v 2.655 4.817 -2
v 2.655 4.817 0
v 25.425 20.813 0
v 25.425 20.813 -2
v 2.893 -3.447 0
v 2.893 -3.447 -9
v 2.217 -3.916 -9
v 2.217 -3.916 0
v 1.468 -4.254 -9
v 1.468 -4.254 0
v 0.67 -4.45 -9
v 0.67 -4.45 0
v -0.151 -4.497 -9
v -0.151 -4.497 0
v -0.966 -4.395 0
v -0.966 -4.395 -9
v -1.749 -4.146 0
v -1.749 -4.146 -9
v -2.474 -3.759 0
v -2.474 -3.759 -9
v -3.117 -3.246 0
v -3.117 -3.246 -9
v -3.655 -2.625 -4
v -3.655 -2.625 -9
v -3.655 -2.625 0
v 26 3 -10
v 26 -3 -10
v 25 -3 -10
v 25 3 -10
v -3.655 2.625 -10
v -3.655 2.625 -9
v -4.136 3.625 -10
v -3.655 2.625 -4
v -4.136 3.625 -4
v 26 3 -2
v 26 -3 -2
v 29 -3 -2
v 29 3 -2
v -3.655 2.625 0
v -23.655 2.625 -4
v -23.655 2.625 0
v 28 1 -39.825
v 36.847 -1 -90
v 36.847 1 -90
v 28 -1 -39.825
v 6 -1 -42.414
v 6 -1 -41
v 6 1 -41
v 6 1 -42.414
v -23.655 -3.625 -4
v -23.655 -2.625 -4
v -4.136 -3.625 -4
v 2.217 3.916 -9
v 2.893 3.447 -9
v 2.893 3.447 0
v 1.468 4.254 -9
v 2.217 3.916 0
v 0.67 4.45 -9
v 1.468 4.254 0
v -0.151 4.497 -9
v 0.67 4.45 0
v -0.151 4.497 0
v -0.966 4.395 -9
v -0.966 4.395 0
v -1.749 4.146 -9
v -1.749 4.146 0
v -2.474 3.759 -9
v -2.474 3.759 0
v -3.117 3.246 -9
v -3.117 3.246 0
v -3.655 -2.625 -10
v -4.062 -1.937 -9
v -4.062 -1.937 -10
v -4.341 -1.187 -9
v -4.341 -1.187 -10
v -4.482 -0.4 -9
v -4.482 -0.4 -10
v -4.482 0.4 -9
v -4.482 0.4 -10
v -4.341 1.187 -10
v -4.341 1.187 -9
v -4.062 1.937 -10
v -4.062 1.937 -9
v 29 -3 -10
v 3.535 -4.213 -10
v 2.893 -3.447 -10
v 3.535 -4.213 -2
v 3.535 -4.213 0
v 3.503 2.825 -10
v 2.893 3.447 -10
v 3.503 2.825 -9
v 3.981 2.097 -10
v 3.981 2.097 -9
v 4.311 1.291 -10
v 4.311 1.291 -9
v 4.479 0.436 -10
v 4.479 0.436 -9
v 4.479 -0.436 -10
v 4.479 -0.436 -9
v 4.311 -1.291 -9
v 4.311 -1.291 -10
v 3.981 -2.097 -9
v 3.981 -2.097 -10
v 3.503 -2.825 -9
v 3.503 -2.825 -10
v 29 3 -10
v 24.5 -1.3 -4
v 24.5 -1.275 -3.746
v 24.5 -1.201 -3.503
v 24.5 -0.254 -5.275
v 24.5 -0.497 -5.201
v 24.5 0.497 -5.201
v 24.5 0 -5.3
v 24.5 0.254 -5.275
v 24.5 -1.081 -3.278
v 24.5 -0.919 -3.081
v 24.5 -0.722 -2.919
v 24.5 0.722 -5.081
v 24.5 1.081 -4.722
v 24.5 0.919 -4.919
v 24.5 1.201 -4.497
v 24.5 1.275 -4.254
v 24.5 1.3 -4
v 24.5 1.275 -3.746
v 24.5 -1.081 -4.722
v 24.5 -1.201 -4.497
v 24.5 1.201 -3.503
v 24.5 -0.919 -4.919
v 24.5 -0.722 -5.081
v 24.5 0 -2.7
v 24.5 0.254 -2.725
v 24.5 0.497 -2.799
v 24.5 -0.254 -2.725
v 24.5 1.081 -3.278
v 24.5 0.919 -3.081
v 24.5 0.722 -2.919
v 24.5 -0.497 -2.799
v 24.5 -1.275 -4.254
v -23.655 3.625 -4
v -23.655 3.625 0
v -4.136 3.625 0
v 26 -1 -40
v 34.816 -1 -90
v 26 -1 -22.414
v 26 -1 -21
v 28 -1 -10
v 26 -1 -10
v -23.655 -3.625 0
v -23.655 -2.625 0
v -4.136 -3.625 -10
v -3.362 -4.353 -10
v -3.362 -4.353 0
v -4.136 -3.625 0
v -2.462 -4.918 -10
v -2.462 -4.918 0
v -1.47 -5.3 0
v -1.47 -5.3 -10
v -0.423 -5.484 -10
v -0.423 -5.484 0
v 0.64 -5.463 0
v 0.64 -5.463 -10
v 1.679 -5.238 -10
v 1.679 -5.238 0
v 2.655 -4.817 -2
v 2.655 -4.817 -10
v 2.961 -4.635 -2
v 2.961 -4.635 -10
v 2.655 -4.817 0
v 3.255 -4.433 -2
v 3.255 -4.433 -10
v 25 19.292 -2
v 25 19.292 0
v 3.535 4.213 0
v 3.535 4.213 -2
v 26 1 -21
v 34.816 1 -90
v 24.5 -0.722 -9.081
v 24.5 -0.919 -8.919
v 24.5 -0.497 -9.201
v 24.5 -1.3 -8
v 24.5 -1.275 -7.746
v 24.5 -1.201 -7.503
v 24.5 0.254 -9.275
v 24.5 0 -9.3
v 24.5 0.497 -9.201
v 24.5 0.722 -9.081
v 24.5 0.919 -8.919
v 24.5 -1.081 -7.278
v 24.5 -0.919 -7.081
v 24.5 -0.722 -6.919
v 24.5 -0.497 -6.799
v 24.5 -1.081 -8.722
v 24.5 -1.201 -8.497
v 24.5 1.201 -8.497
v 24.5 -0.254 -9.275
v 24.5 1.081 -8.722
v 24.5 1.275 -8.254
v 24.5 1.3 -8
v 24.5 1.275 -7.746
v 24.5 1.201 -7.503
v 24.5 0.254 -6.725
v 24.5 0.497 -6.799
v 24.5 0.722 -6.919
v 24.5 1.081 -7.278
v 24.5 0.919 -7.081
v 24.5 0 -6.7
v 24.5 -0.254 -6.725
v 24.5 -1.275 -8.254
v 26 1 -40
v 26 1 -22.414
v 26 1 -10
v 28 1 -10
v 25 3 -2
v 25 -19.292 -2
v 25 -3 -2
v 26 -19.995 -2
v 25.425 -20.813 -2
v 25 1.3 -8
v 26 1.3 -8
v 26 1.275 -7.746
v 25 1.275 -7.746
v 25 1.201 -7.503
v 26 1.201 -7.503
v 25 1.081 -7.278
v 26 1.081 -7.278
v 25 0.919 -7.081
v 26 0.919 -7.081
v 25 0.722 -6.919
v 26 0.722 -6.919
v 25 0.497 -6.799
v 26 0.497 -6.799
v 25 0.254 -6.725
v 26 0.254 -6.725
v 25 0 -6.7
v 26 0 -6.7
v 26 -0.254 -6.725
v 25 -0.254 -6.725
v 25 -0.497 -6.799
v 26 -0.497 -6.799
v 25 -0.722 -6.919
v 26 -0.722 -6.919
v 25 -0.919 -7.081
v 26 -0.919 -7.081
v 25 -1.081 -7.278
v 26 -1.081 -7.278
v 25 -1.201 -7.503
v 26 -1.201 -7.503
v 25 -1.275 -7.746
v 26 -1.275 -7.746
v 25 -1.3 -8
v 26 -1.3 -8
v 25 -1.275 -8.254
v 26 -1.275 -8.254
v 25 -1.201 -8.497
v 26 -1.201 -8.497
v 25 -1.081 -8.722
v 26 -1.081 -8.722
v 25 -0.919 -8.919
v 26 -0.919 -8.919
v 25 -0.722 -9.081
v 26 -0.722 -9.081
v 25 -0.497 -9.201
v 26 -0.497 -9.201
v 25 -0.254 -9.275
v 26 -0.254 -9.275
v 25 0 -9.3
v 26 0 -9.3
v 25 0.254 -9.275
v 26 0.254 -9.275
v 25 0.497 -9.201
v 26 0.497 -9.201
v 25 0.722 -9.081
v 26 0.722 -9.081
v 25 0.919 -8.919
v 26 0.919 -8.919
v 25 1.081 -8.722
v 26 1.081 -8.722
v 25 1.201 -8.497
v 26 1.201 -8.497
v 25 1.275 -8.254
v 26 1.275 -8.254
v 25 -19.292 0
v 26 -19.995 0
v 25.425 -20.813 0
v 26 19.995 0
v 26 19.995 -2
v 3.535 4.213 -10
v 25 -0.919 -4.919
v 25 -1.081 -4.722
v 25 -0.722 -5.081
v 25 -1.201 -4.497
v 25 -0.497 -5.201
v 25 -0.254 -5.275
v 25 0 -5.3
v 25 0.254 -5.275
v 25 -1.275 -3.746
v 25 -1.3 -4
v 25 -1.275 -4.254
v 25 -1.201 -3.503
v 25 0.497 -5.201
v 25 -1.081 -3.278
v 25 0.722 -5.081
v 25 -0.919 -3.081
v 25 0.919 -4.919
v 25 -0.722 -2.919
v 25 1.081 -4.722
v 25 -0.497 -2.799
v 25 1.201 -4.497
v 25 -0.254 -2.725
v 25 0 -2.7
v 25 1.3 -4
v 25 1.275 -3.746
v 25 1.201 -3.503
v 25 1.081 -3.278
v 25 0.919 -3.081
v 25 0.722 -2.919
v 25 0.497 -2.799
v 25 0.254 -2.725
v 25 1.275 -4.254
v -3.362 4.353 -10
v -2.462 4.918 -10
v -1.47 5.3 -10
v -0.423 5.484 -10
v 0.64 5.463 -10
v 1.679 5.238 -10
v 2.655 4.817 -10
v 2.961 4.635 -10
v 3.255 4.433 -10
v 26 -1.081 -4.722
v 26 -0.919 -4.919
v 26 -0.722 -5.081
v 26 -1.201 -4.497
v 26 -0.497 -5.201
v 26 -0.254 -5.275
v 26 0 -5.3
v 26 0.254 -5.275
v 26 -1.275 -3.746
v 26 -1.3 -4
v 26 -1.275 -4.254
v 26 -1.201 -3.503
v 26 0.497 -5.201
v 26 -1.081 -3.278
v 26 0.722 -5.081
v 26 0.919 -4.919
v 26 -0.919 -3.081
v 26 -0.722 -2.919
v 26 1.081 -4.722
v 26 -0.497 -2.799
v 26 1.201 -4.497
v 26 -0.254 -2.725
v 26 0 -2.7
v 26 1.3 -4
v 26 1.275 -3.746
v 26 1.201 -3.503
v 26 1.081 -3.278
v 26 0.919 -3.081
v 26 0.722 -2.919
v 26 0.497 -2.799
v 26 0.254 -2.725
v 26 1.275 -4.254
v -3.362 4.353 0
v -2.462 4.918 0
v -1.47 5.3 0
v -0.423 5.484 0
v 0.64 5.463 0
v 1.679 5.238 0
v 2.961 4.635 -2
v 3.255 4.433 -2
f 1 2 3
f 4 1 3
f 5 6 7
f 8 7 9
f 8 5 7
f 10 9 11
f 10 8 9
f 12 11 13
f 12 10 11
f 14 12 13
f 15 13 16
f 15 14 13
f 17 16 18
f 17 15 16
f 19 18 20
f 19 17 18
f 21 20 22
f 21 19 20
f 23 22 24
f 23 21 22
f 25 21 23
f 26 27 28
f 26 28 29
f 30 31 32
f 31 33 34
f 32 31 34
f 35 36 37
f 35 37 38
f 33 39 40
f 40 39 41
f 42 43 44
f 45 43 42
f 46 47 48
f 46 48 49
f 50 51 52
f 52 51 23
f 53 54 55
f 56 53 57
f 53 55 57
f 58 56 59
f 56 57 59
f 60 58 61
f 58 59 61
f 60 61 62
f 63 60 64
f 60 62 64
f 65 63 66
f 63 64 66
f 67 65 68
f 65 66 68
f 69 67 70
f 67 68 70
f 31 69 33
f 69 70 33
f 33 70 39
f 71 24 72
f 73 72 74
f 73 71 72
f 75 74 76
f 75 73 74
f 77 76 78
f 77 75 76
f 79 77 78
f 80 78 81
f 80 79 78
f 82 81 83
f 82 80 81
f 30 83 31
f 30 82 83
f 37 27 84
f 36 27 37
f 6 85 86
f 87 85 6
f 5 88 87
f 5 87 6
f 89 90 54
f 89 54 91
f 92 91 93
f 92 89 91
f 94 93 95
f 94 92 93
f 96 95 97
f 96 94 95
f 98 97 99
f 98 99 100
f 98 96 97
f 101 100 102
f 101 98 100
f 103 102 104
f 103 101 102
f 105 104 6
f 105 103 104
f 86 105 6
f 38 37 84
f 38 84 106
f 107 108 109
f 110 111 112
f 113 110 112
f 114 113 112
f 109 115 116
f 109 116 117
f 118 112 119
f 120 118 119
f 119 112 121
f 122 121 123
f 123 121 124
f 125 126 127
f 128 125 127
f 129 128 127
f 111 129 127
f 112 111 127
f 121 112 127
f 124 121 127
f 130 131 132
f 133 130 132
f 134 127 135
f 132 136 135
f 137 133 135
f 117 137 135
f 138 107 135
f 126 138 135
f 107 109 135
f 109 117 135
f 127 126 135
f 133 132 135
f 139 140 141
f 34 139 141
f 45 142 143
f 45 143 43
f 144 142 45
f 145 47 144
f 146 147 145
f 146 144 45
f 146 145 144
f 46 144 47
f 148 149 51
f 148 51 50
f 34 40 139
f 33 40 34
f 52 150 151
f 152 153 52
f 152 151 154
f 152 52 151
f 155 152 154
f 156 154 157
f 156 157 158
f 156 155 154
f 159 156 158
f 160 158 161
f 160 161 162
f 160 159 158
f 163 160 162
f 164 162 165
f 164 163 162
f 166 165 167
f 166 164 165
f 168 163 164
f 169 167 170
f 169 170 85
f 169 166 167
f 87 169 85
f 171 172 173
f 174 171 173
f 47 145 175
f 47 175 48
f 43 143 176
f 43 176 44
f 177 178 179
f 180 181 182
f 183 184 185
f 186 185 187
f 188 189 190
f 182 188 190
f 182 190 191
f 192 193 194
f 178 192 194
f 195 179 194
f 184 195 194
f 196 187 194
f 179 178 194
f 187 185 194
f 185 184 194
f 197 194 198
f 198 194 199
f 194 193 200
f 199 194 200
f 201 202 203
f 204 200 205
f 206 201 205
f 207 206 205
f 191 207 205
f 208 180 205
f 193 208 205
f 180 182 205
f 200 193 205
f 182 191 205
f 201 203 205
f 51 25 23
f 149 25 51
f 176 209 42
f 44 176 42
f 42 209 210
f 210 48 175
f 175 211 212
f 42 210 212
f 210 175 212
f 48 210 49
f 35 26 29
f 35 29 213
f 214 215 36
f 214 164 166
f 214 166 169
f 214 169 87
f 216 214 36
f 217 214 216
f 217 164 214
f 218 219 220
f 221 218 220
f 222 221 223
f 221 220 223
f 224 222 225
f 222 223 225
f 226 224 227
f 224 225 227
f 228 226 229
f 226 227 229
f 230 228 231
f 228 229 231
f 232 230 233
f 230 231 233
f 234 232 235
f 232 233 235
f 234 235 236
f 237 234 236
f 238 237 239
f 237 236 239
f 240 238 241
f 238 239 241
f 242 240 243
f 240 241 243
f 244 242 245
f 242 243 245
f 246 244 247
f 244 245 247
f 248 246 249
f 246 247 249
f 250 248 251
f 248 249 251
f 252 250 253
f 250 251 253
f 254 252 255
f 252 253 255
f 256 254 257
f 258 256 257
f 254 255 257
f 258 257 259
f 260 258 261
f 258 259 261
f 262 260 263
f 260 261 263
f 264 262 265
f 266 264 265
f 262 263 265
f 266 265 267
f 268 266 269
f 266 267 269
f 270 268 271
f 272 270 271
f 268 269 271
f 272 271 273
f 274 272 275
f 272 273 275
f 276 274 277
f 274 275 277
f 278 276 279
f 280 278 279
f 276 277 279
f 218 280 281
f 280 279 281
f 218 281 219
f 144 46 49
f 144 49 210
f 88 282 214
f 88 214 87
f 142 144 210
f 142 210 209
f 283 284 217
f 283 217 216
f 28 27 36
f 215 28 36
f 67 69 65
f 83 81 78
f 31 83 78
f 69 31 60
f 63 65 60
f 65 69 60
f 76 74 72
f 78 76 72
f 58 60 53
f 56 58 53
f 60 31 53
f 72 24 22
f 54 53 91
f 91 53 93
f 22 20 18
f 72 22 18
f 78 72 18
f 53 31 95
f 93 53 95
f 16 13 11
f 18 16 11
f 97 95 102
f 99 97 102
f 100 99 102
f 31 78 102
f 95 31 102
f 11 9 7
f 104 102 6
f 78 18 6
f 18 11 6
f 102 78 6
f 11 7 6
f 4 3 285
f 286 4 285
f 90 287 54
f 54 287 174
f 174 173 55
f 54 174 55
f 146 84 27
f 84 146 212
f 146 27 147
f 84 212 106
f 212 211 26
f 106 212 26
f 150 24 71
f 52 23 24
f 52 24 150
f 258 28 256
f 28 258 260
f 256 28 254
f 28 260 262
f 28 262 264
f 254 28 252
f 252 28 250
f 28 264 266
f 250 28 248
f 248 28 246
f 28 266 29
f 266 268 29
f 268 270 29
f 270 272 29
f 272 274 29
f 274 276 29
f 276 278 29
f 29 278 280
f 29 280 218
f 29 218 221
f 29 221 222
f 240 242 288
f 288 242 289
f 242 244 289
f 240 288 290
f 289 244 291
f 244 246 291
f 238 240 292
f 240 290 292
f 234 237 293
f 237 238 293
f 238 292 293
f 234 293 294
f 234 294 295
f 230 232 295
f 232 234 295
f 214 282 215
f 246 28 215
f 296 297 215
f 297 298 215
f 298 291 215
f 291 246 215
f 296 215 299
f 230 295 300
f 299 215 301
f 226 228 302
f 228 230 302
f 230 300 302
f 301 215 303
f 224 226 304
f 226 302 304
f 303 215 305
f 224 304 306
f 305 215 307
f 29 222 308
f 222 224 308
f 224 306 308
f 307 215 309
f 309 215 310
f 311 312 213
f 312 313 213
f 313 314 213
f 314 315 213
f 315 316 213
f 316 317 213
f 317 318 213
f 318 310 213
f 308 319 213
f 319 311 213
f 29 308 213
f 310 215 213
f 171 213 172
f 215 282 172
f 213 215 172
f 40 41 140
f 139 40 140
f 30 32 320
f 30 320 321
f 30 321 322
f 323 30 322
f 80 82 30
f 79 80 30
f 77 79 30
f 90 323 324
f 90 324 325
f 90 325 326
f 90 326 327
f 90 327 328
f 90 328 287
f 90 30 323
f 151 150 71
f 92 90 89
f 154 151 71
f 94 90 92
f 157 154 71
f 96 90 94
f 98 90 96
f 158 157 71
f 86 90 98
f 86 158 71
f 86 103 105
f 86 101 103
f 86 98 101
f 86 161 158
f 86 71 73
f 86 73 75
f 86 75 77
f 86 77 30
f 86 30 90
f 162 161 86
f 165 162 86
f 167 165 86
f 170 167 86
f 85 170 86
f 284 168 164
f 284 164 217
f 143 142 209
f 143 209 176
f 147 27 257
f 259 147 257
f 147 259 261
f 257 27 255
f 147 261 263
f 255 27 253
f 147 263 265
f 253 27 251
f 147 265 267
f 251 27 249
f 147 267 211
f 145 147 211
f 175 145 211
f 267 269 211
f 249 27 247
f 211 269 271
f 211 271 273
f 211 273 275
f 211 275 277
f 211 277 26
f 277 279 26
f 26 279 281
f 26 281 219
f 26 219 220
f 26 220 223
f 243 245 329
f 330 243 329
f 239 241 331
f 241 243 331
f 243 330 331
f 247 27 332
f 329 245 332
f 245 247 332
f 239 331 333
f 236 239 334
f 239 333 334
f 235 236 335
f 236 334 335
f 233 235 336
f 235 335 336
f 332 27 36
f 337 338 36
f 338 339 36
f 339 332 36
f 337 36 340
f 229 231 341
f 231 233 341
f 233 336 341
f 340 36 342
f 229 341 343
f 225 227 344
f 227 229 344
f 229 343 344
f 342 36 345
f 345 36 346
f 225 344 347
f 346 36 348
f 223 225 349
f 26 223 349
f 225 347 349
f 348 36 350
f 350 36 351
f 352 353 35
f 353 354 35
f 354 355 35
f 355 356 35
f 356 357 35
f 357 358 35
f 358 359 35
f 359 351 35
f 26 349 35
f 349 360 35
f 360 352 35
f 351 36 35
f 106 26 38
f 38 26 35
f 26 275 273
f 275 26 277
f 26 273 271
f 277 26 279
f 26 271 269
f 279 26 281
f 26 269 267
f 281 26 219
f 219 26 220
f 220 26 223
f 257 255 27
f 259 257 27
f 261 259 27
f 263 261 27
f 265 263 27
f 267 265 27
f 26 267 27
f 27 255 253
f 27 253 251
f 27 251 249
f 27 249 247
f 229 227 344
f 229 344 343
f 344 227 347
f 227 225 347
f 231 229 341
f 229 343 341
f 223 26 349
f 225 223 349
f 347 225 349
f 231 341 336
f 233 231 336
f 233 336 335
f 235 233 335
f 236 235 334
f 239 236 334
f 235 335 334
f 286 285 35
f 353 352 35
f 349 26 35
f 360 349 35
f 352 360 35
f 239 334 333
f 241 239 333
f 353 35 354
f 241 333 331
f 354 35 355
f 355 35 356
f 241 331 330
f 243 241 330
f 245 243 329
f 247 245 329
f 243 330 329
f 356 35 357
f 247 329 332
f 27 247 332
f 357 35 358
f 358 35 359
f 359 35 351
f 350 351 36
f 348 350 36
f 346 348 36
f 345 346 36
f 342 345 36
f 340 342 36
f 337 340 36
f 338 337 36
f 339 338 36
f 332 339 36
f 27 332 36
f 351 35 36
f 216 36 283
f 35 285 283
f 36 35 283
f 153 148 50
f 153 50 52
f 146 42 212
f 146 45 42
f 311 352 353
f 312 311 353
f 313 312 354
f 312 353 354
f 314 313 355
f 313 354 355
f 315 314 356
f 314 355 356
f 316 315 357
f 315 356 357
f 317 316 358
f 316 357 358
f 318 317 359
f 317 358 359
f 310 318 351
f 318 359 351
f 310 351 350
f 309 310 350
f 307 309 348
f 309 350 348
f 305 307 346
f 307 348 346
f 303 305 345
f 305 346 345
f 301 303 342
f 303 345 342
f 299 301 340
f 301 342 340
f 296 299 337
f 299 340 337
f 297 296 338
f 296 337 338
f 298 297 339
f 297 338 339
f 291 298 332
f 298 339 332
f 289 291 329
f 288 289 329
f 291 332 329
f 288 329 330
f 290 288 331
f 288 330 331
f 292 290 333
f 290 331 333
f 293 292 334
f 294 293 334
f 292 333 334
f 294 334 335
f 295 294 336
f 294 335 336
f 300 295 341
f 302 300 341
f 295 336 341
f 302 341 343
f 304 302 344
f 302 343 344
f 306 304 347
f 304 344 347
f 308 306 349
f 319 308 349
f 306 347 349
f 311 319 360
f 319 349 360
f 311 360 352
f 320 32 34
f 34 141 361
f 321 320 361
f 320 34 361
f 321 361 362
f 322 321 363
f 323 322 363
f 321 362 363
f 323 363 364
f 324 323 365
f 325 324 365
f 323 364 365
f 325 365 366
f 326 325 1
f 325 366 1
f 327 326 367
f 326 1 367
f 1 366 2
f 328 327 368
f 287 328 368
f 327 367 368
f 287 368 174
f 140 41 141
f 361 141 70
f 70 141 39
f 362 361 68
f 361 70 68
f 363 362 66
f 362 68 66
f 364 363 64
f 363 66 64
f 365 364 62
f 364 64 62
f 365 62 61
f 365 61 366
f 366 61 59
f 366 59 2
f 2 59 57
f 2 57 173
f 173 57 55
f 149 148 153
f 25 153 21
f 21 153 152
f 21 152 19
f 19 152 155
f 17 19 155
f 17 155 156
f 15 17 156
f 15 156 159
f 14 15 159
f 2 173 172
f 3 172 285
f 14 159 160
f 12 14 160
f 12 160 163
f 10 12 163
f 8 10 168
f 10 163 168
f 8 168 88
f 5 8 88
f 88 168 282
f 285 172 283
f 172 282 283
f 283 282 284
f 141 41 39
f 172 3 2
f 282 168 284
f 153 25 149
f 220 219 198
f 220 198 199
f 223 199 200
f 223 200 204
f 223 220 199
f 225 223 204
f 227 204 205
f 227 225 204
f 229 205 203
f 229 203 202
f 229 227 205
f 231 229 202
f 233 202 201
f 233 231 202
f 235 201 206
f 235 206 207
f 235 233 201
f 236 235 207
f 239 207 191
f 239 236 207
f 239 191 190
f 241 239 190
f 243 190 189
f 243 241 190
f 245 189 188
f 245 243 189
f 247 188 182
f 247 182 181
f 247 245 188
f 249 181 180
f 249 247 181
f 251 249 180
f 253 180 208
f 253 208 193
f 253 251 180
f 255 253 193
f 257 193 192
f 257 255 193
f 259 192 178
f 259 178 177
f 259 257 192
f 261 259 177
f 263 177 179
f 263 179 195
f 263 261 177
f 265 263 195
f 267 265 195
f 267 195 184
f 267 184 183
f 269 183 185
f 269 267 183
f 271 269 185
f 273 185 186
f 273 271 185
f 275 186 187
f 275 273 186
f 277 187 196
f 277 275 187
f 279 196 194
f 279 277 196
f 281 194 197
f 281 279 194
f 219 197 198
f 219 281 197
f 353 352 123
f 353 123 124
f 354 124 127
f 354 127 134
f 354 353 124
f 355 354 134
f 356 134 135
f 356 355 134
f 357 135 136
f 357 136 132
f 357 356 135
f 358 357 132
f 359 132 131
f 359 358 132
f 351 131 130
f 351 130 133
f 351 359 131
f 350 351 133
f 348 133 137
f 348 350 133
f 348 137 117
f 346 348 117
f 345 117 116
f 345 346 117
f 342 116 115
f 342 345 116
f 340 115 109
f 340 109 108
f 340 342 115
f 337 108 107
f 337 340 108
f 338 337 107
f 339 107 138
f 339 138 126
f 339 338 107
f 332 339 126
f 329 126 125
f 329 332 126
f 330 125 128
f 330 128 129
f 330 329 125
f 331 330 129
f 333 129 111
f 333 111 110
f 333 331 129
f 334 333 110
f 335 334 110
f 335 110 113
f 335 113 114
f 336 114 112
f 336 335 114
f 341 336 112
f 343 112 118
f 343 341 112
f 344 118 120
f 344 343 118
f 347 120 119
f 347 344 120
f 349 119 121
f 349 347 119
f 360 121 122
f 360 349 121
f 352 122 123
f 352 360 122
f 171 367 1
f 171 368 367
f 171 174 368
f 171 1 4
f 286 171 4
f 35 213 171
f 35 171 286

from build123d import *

# Parameters (mm, degrees)
F1_DEPTH  = 2
F2_DEPTH  = 4
F3_DEPTH  = 10
F5_R      = 4.5
F6_DEPTH  = 1
F7_W      = 6
F7_H      = 8
F7_R      = 1.3
F8_DEPTH  = 1
F9_DEPTH  = 3
F10_DEPTH = 1.5
F12_DEPTH = 1


with BuildPart() as f1:
    # F0 (on Top) → F1 (new body)
    with BuildSketch(Plane.XY):
        Polygon((-23.6550478793, -2.625), (-23.6550478793, -3.625), (-4.1363480269, -3.625), (-3.6550478793, -2.625), align=None)
        with BuildLine():
            Line((-3.6550478793, -2.625), (-4.1363480269, -3.625))
            ThreePointArc((-4.1363480269, -3.625), (-0.9506837802, -5.4172133381), (2.6548679611, -4.81681182))
            ThreePointArc((2.6548679611, -4.81681182), (3.1097776177, -4.5364394814), (3.5353318533, -4.2132444372))
            Line((3.5353318533, -4.2132444372), (2.8925442436, -3.447199994))
            ThreePointArc((2.8925442436, -3.447199994), (-0.5606747329, -4.4649349204), (-3.6550478793, -2.625))
        make_face()
        with BuildLine():
            ThreePointArc((3.5353318533, -4.2132444372), (3.1097776177, -4.5364394814), (2.6548679611, -4.81681182))
            Line((2.6548679611, -4.81681182), (25.4251697083, -20.8127749449))
            Line((25.4251697083, -20.8127749449), (26, -19.9945022912))
            Line((26, -19.9945022912), (25, -19.9945022912))
            Line((25, -19.9945022912), (25, -19.2920099262))
            Line((25, -19.2920099262), (3.5353318533, -4.2132444372))
        make_face()
        Polygon((25, 0), (25, -19.2920099262), (26, -19.9945022912), (26, 0), align=None)
        Polygon((26, -19.9945022912), (25, -19.2920099262), (25, -19.9945022912), align=None)
    extrude(amount=-F1_DEPTH)

    # F0 (on Top) → F2 (join)
    with BuildSketch(Plane.XY):
        Polygon((-23.6550478793, -2.625), (-23.6550478793, -3.625), (-4.1363480269, -3.625), (-3.6550478793, -2.625), align=None)
        with BuildLine():
            Line((-3.6550478793, -2.625), (-4.1363480269, -3.625))
            ThreePointArc((-4.1363480269, -3.625), (-0.9506837802, -5.4172133381), (2.6548679611, -4.81681182))
            ThreePointArc((2.6548679611, -4.81681182), (3.1097776177, -4.5364394814), (3.5353318533, -4.2132444372))
            Line((3.5353318533, -4.2132444372), (2.8925442436, -3.447199994))
            ThreePointArc((2.8925442436, -3.447199994), (-0.5606747329, -4.4649349204), (-3.6550478793, -2.625))
        make_face()
    extrude(amount=-F2_DEPTH)

    # F0 (on Top) → F3 (join)
    with BuildSketch(Plane.XY):
        with BuildLine():
            Line((-3.6550478793, -2.625), (-4.1363480269, -3.625))
            ThreePointArc((-4.1363480269, -3.625), (-0.9506837802, -5.4172133381), (2.6548679611, -4.81681182))
            ThreePointArc((2.6548679611, -4.81681182), (3.1097776177, -4.5364394814), (3.5353318533, -4.2132444372))
            Line((3.5353318533, -4.2132444372), (2.8925442436, -3.447199994))
            ThreePointArc((2.8925442436, -3.447199994), (-0.5606747329, -4.4649349204), (-3.6550478793, -2.625))
        make_face()
    extrude(amount=-F3_DEPTH)

    # F4: F1 across plane


with BuildPart() as f1_1:
    add(f1.part)
    add(f1.part.mirror(Plane.XZ))

    # F5 (on face) → F6 (join)
    with BuildSketch(Plane(origin=(0, 0, -10), x_dir=(1, 0, 0), z_dir=(0, 0, -1))):
        Circle(F5_R)
    extrude(amount=-F6_DEPTH)

    # F7 (on face) → F8 (join, through all)
    with BuildSketch(Plane.YZ.offset(26)):
        with Locations((0, -6)):
            Rectangle(F7_W, F7_H)
        with Locations((0, -8)):
            Circle(F7_R, mode=Mode.SUBTRACT)
        with Locations((0, -4)):
            Circle(F7_R, mode=Mode.SUBTRACT)
    extrude(amount=-F8_DEPTH)


with BuildPart() as f9:
    # F7 (on face) → F9 (new body)
    with BuildSketch(Plane.YZ.offset(26)):
        with Locations((0, -6)):
            Rectangle(F7_W, F7_H)
        with Locations((0, -8)):
            Circle(F7_R, mode=Mode.SUBTRACT)
        with Locations((0, -4)):
            Circle(F7_R, mode=Mode.SUBTRACT)
        with Locations((0, -4)):
            Circle(F7_R)
        with Locations((0, -8)):
            Circle(F7_R)
    extrude(amount=F9_DEPTH)

    # F7 (on face) → F10 (join)
    with BuildSketch(Plane.YZ.offset(26)):
        with Locations((0, -4)):
            Circle(F7_R)
        with Locations((0, -8)):
            Circle(F7_R)
    extrude(amount=-F10_DEPTH)

    # F11 (on Front) → F12 (join, symmetric)
    with BuildSketch(Plane.XZ):
        Polygon((28, -10), (26, -10), (26, -21), (6, -41), (6, -42.4142135624), (26, -22.4142135624), (26, -40), (34.8163490354, -90), (36.8472022592, -90), (28, -39.8250226729), align=None)
    extrude(amount=F12_DEPTH, both=True)


solid = Compound([f1_1.part, f9.part])
